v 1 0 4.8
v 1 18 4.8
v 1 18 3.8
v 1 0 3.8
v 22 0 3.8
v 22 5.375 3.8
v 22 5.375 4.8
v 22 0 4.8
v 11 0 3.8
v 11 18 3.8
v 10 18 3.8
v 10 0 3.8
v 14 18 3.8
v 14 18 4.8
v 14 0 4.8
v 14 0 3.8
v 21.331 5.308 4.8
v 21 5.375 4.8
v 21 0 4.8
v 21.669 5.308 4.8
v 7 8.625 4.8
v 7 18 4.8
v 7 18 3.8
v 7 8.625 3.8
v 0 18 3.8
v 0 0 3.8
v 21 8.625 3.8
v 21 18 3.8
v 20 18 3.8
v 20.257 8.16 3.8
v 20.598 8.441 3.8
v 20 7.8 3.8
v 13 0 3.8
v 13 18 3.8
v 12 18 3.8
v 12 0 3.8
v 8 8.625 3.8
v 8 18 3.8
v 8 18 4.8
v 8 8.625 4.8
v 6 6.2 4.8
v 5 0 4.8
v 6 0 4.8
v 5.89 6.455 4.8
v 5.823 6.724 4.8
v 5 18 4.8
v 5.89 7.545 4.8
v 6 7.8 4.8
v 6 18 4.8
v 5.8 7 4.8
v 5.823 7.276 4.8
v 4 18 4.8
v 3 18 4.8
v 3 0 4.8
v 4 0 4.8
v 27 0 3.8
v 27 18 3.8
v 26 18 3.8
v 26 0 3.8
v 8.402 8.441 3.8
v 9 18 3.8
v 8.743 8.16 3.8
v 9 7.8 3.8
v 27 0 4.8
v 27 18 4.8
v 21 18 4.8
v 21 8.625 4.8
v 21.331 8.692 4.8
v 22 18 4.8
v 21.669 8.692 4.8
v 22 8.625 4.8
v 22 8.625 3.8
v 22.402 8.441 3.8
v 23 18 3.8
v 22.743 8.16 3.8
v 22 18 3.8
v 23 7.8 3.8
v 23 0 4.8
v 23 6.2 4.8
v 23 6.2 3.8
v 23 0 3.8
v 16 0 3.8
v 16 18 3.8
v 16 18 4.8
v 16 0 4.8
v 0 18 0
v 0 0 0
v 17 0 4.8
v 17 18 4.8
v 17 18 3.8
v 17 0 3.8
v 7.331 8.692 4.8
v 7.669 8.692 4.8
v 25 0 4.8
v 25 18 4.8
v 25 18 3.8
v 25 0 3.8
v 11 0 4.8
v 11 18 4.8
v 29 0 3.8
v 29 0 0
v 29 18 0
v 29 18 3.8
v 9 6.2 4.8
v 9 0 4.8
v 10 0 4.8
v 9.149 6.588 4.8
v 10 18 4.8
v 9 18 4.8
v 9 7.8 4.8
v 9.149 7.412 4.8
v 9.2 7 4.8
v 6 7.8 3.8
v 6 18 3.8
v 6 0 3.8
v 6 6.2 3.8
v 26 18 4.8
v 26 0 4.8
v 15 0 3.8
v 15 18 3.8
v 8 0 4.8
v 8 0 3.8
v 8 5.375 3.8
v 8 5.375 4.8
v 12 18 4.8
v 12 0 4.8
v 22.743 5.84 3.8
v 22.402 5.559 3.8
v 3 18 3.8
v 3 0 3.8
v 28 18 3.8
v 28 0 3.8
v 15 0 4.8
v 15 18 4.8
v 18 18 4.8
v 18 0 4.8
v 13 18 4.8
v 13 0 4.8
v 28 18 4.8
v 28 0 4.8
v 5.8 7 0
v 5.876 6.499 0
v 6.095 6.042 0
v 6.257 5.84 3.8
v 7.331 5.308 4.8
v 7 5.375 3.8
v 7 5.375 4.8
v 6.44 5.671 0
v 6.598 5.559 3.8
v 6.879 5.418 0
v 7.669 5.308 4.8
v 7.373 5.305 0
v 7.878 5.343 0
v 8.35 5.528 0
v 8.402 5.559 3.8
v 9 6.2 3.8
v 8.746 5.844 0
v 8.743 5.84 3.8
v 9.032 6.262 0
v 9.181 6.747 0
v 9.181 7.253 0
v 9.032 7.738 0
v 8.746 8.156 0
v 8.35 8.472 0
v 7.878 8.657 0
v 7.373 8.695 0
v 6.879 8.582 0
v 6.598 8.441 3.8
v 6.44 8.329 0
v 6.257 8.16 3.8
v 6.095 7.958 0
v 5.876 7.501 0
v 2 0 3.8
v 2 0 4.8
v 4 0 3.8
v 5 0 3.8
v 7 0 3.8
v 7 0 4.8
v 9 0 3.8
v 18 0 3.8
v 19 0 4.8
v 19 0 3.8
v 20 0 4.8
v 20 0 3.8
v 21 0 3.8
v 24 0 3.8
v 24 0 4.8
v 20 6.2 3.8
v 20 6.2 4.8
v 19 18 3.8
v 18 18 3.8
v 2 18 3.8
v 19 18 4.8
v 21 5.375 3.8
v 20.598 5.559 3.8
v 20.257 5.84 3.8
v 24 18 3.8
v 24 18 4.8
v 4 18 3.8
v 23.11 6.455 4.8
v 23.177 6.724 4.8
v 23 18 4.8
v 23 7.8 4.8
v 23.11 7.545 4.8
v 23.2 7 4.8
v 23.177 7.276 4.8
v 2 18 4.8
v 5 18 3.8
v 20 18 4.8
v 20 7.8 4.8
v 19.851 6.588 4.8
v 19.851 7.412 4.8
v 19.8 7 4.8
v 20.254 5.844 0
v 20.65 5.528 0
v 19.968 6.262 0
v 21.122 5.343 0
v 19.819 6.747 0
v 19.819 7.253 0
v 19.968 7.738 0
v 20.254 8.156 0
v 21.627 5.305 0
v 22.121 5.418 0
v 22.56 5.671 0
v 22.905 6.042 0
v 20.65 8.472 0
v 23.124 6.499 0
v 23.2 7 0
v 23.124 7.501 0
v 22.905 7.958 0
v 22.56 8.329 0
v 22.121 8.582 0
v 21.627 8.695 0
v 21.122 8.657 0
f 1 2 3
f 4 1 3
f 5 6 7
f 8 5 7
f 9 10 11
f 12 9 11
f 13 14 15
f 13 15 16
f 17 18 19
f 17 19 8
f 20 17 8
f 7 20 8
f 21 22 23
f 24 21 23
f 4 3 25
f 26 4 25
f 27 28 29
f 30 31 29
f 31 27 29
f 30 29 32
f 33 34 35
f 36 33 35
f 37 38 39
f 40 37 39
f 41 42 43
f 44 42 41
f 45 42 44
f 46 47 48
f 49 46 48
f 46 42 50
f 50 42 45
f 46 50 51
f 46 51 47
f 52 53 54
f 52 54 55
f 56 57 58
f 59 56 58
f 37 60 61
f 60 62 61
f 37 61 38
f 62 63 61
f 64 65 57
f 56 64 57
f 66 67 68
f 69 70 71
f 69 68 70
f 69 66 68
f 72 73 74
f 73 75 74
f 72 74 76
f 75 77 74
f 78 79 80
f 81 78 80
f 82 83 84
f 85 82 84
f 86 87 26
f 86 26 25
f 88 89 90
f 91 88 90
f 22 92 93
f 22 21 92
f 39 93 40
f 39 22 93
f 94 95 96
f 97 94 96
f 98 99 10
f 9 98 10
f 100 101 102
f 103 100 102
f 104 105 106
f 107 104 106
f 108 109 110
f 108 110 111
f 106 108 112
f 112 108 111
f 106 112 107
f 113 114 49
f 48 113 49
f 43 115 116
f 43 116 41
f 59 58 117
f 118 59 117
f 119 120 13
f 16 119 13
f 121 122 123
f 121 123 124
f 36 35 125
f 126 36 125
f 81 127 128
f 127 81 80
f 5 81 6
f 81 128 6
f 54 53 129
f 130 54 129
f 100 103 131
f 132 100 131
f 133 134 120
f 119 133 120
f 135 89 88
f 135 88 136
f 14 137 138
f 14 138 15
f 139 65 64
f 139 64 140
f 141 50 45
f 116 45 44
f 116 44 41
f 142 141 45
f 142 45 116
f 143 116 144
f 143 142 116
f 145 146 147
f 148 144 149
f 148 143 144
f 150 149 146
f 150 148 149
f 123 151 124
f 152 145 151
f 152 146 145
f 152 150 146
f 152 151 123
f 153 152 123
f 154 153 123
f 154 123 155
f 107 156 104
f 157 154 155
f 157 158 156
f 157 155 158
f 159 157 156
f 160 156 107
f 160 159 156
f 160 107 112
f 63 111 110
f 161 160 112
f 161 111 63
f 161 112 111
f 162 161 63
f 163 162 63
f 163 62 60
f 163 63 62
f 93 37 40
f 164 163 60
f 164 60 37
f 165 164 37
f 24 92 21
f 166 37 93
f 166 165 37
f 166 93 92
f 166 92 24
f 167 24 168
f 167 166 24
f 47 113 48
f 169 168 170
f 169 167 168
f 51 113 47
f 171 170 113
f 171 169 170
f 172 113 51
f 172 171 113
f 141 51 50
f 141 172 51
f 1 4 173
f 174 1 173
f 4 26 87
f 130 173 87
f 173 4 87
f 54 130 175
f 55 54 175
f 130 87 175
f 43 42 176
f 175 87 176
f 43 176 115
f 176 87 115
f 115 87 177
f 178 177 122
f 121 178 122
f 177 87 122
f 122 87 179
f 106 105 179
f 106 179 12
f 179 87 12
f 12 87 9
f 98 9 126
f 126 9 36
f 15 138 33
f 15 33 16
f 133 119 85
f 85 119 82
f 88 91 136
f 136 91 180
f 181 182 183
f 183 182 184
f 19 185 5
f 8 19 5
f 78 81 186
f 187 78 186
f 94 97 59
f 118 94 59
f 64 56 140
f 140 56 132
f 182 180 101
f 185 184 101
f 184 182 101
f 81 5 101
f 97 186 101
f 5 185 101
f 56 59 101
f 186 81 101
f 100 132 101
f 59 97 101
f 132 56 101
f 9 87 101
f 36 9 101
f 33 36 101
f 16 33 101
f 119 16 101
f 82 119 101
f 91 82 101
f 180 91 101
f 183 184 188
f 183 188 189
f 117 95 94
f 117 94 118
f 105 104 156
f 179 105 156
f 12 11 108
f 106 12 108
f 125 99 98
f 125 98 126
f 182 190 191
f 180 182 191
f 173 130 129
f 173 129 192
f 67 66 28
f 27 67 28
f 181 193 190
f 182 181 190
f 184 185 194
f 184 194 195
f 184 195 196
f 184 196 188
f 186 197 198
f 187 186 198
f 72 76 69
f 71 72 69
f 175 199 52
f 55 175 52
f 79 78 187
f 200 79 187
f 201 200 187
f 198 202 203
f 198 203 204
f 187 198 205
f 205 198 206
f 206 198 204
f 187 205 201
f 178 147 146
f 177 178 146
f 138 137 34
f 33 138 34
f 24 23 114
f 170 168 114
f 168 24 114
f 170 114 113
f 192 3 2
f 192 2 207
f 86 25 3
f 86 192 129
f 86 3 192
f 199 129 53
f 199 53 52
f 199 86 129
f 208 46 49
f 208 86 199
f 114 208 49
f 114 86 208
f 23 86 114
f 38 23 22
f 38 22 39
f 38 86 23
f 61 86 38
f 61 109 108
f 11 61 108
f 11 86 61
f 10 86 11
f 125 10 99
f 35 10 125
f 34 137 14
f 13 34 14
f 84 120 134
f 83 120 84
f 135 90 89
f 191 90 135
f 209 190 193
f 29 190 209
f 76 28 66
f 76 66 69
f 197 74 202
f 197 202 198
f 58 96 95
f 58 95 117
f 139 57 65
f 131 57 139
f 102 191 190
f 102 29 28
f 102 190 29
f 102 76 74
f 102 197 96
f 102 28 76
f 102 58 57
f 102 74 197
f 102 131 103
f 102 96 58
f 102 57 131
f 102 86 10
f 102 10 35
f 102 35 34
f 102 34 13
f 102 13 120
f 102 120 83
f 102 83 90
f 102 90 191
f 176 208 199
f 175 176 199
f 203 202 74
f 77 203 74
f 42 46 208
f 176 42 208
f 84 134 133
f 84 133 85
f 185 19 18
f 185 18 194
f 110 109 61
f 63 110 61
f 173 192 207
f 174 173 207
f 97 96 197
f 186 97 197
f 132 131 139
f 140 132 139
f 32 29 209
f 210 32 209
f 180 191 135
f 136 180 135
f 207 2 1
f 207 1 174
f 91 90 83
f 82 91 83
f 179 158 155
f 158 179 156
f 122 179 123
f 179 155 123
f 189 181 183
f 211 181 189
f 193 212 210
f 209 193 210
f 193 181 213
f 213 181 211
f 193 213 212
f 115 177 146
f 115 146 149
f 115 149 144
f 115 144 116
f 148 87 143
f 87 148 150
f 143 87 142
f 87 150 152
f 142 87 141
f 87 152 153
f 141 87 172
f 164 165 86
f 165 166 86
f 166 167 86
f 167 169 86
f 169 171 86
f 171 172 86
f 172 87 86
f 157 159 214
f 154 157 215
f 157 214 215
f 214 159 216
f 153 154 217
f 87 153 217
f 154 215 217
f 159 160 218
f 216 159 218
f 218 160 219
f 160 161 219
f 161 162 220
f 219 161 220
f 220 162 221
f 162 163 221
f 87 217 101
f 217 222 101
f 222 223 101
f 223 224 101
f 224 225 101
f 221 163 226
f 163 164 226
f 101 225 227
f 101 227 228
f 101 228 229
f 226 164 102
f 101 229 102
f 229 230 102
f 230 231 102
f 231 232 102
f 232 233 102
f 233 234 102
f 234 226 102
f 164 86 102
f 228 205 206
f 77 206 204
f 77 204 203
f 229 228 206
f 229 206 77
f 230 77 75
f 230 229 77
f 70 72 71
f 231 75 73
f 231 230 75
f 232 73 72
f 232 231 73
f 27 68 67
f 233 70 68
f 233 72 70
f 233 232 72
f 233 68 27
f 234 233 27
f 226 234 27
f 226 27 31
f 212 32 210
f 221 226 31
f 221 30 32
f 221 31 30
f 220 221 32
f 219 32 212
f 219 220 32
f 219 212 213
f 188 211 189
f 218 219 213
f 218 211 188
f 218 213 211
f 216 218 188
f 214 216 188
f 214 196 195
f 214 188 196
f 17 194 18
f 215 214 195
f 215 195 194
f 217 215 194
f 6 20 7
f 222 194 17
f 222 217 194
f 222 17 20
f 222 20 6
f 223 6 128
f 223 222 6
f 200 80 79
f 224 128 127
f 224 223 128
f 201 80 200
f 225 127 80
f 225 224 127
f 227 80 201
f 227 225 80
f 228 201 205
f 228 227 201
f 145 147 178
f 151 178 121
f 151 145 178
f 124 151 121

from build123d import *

# Parameters (mm, degrees)
SKETCH_1_W          = 29
SKETCH_1_H          = 18
SKETCH_1_R          = 1.7
EXTRUDE_1_DEPTH     = 4.8
SKETCH_2_W          = 0.5
SKETCH_2_H          = 1
CUT_EXTRUDE_1_DEPTH = 35.467956133


with BuildPart() as part:
    # 草图1 → 凸台-拉伸1 (new body)
    with BuildSketch(Plane.XY):
        with Locations((14.5, 9)):
            Rectangle(SKETCH_1_W, SKETCH_1_H)
        with Locations((21.5, 7)):
            Circle(SKETCH_1_R, mode=Mode.SUBTRACT)
        with Locations(Location((7.5, 7, 0), (0, 0, 180))):
            Circle(SKETCH_1_R, mode=Mode.SUBTRACT)
    extrude(amount=EXTRUDE_1_DEPTH)

    # 草图2 → 切除-拉伸1 (cut, through all)
    with BuildSketch(Plane(origin=(0, 18, 0), x_dir=(1, 0, 0), z_dir=(0, 1, 0))):
        Polygon((0, -4.8), (1, -4.8), (1, -3.8), (0.5, -3.8), (0, -3.8), align=None)
        Polygon((2, -4.8), (3, -4.8), (3, -3.8), (2.5, -3.8), (2, -3.8), align=None)
        Polygon((4, -4.8), (5, -4.8), (5, -3.8), (4.5, -3.8), (4, -3.8), align=None)
        Polygon((6, -4.8), (7, -4.8), (7, -3.8), (6.5, -3.8), (6, -3.8), align=None)
        Polygon((8, -4.8), (9, -4.8), (9, -3.8), (8.5, -3.8), (8, -3.8), align=None)
        Polygon((10, -4.8), (11, -4.8), (11, -3.8), (10.5, -3.8), (10, -3.8), align=None)
        Polygon((12, -4.8), (13, -4.8), (13, -3.8), (12.5, -3.8), (12, -3.8), align=None)
        with Locations((14.75, -4.3)):
            Rectangle(SKETCH_2_W, SKETCH_2_H)
        with Locations((14.25, -4.3)):
            Rectangle(SKETCH_2_W, SKETCH_2_H)
        Polygon((16, -3.8), (16, -4.8), (17, -4.8), (17, -3.8), (16.5, -3.8), align=None)
        Polygon((18, -3.8), (18, -4.8), (19, -4.8), (19, -3.8), (18.5, -3.8), align=None)
        Polygon((20, -3.8), (20, -4.8), (21, -4.8), (21, -3.8), (20.5, -3.8), align=None)
        Polygon((22, -3.8), (22, -4.8), (23, -4.8), (23, -3.8), (22.5, -3.8), align=None)
        Polygon((24, -3.8), (24, -4.8), (25, -4.8), (25, -3.8), (24.5, -3.8), align=None)
        Polygon((26, -3.8), (26, -4.8), (27, -4.8), (27, -3.8), (26.5, -3.8), align=None)
        Polygon((28, -3.8), (28, -4.8), (29, -4.8), (29, -3.8), (28.5, -3.8), align=None)
    extrude(amount=-CUT_EXTRUDE_1_DEPTH, mode=Mode.SUBTRACT)


solid = part.part
